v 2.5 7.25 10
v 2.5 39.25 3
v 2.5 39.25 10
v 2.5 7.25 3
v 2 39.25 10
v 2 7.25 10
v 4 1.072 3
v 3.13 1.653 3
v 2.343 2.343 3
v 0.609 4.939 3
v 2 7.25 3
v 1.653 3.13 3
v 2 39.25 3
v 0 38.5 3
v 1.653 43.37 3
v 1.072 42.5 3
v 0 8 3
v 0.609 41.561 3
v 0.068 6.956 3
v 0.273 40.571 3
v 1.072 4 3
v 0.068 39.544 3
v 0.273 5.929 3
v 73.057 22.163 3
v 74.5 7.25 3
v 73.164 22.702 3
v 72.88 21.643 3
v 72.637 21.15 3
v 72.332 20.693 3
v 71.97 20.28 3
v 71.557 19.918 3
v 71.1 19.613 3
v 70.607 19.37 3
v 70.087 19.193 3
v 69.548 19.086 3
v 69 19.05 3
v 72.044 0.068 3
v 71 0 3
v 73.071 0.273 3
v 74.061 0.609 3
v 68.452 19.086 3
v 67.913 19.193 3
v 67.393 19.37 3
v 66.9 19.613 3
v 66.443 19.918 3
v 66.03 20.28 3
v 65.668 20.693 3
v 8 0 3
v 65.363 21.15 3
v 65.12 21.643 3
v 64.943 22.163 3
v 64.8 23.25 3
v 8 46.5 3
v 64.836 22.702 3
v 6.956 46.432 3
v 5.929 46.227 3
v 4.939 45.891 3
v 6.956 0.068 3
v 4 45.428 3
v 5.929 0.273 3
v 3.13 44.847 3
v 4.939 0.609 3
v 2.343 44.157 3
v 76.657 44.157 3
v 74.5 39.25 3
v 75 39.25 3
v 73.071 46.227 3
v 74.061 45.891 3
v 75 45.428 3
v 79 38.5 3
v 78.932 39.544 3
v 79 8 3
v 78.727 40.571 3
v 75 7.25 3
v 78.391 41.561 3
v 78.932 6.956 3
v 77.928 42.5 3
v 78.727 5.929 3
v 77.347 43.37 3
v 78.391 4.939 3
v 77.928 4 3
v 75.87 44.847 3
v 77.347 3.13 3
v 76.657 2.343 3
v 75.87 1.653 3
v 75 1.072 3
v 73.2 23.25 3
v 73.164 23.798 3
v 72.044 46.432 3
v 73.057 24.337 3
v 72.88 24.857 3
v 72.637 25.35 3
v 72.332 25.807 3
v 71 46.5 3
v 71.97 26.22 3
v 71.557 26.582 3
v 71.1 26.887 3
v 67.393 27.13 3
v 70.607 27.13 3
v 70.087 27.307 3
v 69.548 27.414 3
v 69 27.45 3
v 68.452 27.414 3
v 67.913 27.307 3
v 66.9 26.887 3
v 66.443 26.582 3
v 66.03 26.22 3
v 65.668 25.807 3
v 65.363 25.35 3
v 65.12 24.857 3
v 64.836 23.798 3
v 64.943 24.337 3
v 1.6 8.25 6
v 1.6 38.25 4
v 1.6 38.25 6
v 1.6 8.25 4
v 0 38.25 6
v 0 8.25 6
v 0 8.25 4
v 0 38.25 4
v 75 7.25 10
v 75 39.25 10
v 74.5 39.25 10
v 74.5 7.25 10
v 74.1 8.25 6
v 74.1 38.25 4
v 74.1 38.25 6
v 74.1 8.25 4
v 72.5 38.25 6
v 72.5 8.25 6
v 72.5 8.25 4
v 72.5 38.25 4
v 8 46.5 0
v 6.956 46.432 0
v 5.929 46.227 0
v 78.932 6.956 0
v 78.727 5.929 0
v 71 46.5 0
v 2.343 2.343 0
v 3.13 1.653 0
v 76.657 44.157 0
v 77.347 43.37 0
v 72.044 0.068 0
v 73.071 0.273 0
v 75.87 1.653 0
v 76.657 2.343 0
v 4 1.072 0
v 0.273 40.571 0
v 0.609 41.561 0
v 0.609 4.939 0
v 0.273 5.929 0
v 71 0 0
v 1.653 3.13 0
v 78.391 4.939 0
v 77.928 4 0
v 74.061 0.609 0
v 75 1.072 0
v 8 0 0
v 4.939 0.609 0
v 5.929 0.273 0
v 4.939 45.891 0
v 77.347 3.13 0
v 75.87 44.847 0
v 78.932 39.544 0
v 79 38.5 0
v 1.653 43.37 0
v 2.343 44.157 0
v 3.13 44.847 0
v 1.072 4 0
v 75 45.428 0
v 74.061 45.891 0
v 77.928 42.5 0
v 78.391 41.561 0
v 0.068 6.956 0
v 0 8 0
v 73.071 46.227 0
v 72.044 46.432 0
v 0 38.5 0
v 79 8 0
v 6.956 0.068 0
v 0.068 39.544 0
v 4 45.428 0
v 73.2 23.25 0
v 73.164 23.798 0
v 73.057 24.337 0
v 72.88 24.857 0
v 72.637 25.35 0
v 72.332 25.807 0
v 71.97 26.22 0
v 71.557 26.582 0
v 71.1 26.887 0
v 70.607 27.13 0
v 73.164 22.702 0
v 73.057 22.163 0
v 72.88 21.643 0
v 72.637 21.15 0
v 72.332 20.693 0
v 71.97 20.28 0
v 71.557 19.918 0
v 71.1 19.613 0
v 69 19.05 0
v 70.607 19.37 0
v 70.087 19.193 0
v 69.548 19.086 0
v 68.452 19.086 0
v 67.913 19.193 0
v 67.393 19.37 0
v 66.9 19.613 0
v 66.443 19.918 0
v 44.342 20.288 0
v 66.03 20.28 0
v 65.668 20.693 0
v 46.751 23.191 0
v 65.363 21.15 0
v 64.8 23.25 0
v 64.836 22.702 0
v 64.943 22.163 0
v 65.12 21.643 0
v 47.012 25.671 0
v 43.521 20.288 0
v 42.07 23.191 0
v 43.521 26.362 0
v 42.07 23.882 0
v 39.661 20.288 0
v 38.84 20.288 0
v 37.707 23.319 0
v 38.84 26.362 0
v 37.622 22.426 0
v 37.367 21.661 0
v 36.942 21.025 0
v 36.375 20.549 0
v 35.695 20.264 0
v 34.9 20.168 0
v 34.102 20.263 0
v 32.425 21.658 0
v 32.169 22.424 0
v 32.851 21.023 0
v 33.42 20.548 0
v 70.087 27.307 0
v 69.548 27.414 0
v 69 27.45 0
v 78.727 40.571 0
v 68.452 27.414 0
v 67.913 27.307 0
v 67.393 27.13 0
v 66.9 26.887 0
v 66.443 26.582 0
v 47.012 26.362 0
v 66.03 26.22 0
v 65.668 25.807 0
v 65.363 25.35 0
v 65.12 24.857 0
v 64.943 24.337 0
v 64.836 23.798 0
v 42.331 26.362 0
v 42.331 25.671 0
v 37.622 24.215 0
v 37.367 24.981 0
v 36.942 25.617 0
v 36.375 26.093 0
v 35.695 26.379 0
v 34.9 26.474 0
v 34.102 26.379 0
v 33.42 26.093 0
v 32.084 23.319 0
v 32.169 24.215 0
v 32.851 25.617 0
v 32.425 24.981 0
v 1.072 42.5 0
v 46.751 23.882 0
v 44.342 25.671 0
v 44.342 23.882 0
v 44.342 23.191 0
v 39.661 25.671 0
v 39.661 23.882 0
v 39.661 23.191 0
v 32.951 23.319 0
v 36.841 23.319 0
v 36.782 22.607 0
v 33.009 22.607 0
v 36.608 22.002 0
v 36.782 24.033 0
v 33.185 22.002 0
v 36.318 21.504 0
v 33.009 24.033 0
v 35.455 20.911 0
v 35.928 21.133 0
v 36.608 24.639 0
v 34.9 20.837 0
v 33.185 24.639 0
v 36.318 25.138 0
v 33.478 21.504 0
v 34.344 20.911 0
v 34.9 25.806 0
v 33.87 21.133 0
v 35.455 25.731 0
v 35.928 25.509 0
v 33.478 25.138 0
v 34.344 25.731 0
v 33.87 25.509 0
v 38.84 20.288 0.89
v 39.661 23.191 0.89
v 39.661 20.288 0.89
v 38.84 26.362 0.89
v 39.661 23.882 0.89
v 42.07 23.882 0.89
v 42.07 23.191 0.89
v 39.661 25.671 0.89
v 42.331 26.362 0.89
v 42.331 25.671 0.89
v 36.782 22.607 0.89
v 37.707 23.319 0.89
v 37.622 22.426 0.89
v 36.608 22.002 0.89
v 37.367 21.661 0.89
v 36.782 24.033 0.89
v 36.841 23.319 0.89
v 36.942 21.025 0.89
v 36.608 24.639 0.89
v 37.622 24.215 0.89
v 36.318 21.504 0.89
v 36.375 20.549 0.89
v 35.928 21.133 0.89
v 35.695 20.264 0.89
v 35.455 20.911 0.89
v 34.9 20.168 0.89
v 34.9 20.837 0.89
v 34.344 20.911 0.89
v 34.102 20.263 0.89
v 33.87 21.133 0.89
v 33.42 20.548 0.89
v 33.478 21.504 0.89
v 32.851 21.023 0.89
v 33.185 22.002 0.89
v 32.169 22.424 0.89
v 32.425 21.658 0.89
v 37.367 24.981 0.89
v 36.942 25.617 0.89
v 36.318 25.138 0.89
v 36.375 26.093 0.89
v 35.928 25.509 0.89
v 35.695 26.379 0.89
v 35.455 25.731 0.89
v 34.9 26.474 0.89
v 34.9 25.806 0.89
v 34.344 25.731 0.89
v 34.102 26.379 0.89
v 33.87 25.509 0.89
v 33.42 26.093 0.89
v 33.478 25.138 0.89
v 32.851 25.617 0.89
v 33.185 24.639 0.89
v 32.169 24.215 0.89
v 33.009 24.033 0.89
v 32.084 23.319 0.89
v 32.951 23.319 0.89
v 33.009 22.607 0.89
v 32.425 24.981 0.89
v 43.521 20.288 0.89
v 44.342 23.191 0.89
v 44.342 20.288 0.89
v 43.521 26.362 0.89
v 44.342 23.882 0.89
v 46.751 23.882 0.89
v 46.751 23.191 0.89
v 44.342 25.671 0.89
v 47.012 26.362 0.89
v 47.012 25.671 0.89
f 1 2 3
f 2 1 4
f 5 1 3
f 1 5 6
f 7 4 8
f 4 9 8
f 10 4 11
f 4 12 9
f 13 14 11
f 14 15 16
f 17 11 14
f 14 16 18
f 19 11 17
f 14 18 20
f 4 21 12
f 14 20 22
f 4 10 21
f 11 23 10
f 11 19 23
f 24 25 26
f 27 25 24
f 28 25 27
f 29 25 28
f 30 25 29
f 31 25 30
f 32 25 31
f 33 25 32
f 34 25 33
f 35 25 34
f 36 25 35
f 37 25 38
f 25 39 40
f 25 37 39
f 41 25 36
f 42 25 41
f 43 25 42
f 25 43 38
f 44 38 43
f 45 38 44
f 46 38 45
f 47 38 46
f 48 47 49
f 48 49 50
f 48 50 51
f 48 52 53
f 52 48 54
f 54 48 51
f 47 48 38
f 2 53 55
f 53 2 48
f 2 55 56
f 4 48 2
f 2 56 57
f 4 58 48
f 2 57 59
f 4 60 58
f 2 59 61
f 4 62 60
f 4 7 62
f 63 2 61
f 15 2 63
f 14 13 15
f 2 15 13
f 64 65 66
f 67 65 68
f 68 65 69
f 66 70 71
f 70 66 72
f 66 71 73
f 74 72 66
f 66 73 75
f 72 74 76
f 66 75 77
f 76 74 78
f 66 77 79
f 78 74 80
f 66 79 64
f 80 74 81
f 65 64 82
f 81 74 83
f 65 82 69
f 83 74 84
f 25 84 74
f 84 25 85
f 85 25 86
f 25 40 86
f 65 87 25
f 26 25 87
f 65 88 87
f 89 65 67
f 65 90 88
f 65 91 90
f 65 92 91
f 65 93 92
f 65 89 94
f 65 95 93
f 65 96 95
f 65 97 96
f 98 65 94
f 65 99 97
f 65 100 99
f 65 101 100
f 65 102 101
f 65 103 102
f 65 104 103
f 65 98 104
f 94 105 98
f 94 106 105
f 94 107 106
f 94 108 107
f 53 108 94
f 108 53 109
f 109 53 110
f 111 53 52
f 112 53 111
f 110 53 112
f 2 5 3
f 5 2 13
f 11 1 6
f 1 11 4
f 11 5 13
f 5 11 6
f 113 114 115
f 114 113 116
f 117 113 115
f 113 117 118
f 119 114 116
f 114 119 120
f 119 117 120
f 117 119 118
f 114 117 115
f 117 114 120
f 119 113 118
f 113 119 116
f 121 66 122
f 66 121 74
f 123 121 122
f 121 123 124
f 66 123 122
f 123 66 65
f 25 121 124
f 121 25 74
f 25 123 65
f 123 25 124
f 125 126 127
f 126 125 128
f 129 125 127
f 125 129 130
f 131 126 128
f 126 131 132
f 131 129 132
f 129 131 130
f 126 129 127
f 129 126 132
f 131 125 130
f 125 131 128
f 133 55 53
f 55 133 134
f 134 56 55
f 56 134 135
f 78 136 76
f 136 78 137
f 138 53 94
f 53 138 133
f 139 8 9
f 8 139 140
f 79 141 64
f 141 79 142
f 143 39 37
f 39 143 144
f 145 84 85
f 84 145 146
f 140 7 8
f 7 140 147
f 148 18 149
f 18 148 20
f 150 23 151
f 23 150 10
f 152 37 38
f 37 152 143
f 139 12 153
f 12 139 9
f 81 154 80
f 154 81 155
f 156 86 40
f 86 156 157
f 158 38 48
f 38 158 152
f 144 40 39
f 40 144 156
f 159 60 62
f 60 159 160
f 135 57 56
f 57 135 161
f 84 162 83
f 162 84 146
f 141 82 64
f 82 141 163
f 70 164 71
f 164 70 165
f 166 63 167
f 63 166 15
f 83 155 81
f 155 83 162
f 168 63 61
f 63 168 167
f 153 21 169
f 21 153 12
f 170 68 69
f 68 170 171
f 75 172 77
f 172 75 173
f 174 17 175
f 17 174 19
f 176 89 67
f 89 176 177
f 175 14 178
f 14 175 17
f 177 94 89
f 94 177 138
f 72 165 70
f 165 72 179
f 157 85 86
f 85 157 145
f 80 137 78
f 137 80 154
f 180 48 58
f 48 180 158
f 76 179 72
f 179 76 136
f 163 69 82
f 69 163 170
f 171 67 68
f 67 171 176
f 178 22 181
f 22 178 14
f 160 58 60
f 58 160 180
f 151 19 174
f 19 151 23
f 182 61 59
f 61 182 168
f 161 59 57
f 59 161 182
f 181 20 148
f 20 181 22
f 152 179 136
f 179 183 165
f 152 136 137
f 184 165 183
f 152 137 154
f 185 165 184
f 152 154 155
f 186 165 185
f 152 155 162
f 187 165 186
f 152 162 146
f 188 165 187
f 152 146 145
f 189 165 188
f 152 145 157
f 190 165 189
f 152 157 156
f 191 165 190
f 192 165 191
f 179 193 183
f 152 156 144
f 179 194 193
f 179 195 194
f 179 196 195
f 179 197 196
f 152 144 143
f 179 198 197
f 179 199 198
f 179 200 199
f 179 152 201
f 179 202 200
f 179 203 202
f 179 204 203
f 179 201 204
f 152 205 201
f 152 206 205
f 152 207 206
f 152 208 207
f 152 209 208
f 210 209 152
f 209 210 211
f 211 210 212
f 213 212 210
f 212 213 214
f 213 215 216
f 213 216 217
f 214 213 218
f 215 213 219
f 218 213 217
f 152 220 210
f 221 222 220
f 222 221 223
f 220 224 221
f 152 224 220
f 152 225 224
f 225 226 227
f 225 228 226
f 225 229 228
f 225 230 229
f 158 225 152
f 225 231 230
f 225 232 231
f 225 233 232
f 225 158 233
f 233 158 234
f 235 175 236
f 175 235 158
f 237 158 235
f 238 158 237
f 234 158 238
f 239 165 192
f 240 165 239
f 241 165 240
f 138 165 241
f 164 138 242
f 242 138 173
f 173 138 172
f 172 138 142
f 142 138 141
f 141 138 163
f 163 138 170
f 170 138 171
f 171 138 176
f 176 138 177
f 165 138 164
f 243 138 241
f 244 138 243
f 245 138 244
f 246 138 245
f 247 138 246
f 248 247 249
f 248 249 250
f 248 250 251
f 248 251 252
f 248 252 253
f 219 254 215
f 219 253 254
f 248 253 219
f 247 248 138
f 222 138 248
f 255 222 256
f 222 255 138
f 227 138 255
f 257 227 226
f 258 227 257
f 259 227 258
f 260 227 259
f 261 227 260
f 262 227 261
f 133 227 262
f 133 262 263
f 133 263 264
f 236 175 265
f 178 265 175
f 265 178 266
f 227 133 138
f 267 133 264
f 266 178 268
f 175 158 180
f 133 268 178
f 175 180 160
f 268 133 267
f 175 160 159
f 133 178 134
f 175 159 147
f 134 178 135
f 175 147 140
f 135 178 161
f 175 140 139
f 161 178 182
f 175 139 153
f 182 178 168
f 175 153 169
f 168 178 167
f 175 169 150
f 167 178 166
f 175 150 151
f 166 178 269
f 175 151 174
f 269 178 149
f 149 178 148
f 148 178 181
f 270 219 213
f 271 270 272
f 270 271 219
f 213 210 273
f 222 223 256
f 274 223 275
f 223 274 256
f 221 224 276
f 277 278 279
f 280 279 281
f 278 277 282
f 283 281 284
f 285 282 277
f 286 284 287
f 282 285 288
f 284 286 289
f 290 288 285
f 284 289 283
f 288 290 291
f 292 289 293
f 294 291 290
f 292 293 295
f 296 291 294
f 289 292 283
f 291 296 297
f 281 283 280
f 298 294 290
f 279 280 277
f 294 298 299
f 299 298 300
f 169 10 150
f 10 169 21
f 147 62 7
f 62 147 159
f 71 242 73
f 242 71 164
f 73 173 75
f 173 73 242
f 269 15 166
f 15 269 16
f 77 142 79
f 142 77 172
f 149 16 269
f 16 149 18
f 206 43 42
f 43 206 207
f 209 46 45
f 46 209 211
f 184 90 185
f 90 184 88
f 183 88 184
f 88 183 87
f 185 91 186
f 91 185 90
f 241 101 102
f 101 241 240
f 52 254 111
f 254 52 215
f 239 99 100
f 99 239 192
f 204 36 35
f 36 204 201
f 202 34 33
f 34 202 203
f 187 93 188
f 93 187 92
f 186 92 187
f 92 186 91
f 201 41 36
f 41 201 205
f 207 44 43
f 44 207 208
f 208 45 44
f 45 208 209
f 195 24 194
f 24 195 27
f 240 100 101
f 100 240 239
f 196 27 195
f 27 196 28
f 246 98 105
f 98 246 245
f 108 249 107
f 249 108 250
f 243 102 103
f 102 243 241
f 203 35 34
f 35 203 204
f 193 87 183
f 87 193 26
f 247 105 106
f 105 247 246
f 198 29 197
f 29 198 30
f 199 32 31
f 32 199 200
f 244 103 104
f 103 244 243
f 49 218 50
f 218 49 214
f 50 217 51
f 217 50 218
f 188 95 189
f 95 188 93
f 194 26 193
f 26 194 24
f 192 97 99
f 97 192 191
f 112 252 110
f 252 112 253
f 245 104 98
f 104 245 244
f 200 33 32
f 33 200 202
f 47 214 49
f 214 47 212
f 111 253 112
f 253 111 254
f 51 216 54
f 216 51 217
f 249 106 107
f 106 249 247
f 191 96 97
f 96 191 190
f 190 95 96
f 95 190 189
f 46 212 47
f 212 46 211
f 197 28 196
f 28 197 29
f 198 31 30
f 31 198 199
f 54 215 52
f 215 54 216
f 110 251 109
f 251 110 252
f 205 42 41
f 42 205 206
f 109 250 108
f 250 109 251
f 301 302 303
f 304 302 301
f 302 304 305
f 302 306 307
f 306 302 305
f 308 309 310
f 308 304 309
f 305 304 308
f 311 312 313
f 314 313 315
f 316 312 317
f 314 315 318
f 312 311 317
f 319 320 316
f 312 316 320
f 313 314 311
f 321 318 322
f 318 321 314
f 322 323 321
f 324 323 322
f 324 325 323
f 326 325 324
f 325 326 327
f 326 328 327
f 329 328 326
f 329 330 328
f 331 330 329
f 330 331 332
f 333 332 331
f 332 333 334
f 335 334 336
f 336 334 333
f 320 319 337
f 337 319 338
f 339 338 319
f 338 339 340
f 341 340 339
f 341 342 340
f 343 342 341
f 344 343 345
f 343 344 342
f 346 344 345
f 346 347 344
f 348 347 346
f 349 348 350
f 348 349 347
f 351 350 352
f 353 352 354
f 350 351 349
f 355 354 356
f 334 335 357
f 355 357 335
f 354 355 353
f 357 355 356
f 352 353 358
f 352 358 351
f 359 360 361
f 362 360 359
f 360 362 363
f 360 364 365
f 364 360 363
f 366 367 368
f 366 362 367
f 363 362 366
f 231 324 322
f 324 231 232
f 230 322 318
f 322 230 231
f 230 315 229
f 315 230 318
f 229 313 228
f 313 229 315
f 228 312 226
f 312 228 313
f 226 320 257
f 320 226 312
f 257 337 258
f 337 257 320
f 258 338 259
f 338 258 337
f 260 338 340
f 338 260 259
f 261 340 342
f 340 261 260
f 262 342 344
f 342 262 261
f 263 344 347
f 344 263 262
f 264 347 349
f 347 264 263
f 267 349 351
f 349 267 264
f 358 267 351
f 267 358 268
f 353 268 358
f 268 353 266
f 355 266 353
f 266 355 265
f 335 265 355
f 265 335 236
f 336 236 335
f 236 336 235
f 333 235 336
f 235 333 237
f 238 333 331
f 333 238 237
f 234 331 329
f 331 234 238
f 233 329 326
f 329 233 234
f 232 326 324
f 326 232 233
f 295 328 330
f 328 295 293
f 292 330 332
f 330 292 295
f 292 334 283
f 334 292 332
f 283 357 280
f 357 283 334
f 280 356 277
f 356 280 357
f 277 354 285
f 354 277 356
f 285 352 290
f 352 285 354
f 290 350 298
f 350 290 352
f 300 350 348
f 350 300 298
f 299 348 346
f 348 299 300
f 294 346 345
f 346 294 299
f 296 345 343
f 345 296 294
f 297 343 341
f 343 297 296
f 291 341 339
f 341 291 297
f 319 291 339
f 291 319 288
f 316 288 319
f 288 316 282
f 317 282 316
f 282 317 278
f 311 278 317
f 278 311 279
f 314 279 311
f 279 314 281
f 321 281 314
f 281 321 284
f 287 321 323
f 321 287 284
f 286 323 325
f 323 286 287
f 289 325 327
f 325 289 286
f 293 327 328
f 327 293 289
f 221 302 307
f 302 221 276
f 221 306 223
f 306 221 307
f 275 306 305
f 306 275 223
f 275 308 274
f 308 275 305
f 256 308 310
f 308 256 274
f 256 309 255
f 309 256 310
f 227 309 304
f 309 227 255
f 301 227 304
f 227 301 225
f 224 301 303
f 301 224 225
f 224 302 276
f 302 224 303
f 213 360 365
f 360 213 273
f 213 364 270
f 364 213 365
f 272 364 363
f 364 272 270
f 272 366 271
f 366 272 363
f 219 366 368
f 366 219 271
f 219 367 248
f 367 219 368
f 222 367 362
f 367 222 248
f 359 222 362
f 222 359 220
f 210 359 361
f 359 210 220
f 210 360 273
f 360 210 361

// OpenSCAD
// =========================================================================
// PumpLogger Magnet-Cap — v0 — 2026-05-20
//
// Bright red cover that snap-clips over the case lid. Has an embedded
// neodymium magnet that activates the Hall sensor inside the box, putting
// the box into OFF state. Remove cap → box ON.
//
// Design philosophy:
//   - WHOLE-LID coverage in signal red = impossible to forget while pumping
//   - Snap tabs on the two SHORT ends grip the lid → won't fall off
//   - Print in red PLA or PETG
//   - Tactile UX: clear "click" on insertion, requires firm pull to remove
//
// Must match case.scad's lid dimensions. Import the case.scad parameters
// for guaranteed compatibility.
// =========================================================================

use <case.scad>

// ====== Import constants from case.scad ===================================
// (kept duplicated here for OpenSCAD's scope rules — case.scad's globals
// aren't auto-visible. Edit BOTH if you change them.)

ext_x      = 75;   // lid external X (must match case.scad)
ext_y      = 42.5; // lid external Y
corner_r   = 6.0;
wall       = 2.0;
top_th     = 2.0;
lid_in_z   = 13;
lid_ext_z  = lid_in_z + top_th;

// Cap geometry
cap_thickness    = 3.0;       // top plate thickness (carries magnet)
cap_overhang     = 2.0;       // how much the cap extends beyond the lid edges
cap_tab_z        = 7.0;       // how far down the tabs reach (must cover snap recess)

// Snap-tab geometry (must match cap_snap_* in case.scad's lid)
cap_snap_w   = 30;            // tab width along the lid short edge
cap_snap_h   = 2;             // nub height
cap_snap_d   = 0.8;           // nub protrusion inward
cap_snap_z   = 4;             // nub Z position from cap top

// Magnet pocket — N42 neodymium disc, 8mm diameter × 3mm height
magnet_d         = 8.0;
magnet_h         = 3.0;
magnet_pocket_clearance = 0.2;   // press-fit clearance

// Hall sensor position in CASE coordinates — pulled from case.scad
// (this is where the magnet must be aligned with — i.e., centred above
// the Hall sensor)
hall_pos = [ext_x - wall - 6, ext_y / 2];   // ≈ matches case.scad's hall_sensor_xy_in_body

// Optional: embossed text on cap top
emboss_text   = "OFF";
emboss_depth  = 0.8;
emboss_height = 6;            // character size


// ====== HELPER MODULES ====================================================

module rounded_box(x, y, z, r) {
  hull() {
    for (px = [r, x-r], py = [r, y-r])
      translate([px, py, 0]) cylinder(h=z, r=r, $fn=48);
  }
}


// ====== CAP ===============================================================

module magnet_cap() {
  // Cap covers the full lid + small overhang for grip
  cap_x = ext_x + 2 * cap_overhang;
  cap_y = ext_y + 2 * cap_overhang;
  cap_r = corner_r + cap_overhang;

  difference() {
    union() {
      // Top plate
      rounded_box(cap_x, cap_y, cap_thickness, cap_r);
      // Two side tabs on the SHORT ends, hanging down to grip the lid
      for (side = [0, 1])
        translate([side == 0 ? 0 : cap_x - 2 * cap_overhang - wall - 0.5,
                   (cap_y - cap_snap_w) / 2 - 1,
                   cap_thickness])
          tab();
    }

    // Magnet pocket — hole on the inside (bottom) of the cap plate,
    // positioned over the Hall sensor
    translate([hall_pos[0] + cap_overhang, hall_pos[1] + cap_overhang,
               -0.1])
      cylinder(h=magnet_h + magnet_pocket_clearance,
               d=magnet_d + 2 * magnet_pocket_clearance,
               $fn=48);

    // Embossed OFF text on the OUTSIDE face of the cap (the side the
    // user sees). The +z face is where the tabs root, i.e., the inside
    // (touches the lid). Carve the text into the -z face instead.
    translate([cap_x / 2, cap_y / 2, -0.01])
      linear_extrude(emboss_depth + 0.1)
        text(emboss_text, size = emboss_height,
             halign = "center", valign = "center", font = "Arial Black");
  }
}

// One side tab — flexes to snap-in over the lid short edge.
module tab() {
  // Solid block running down beside the lid, with snap nub at the right Z
  difference() {
    cube([wall + 0.5, cap_snap_w + 2, cap_tab_z]);
    // Carve out the inside so it's a thin flexing wall
    translate([0, 0, -0.1])
      cube([wall, cap_snap_w + 2, cap_tab_z + 0.2]);
  }
  // The snap-nub itself — sticks INTO the cap interior toward the lid wall
  translate([0, 1, cap_tab_z - cap_snap_z - cap_snap_h])
    cube([cap_snap_d * 2, cap_snap_w, cap_snap_h]);
}


// ====== RENDER ============================================================

cap_color = "red";

color(cap_color) magnet_cap();

echo(str("Cap external: ", ext_x + 2*cap_overhang, " x ",
         ext_y + 2*cap_overhang, " x ", cap_thickness + cap_tab_z, " mm"));
echo(str("Magnet: ", magnet_d, " x ", magnet_h, " mm, glued in cap"));
echo(str("Hall position over lid (X,Y from cap origin): ",
         hall_pos[0] + cap_overhang, " mm, ",
         hall_pos[1] + cap_overhang, " mm"));
